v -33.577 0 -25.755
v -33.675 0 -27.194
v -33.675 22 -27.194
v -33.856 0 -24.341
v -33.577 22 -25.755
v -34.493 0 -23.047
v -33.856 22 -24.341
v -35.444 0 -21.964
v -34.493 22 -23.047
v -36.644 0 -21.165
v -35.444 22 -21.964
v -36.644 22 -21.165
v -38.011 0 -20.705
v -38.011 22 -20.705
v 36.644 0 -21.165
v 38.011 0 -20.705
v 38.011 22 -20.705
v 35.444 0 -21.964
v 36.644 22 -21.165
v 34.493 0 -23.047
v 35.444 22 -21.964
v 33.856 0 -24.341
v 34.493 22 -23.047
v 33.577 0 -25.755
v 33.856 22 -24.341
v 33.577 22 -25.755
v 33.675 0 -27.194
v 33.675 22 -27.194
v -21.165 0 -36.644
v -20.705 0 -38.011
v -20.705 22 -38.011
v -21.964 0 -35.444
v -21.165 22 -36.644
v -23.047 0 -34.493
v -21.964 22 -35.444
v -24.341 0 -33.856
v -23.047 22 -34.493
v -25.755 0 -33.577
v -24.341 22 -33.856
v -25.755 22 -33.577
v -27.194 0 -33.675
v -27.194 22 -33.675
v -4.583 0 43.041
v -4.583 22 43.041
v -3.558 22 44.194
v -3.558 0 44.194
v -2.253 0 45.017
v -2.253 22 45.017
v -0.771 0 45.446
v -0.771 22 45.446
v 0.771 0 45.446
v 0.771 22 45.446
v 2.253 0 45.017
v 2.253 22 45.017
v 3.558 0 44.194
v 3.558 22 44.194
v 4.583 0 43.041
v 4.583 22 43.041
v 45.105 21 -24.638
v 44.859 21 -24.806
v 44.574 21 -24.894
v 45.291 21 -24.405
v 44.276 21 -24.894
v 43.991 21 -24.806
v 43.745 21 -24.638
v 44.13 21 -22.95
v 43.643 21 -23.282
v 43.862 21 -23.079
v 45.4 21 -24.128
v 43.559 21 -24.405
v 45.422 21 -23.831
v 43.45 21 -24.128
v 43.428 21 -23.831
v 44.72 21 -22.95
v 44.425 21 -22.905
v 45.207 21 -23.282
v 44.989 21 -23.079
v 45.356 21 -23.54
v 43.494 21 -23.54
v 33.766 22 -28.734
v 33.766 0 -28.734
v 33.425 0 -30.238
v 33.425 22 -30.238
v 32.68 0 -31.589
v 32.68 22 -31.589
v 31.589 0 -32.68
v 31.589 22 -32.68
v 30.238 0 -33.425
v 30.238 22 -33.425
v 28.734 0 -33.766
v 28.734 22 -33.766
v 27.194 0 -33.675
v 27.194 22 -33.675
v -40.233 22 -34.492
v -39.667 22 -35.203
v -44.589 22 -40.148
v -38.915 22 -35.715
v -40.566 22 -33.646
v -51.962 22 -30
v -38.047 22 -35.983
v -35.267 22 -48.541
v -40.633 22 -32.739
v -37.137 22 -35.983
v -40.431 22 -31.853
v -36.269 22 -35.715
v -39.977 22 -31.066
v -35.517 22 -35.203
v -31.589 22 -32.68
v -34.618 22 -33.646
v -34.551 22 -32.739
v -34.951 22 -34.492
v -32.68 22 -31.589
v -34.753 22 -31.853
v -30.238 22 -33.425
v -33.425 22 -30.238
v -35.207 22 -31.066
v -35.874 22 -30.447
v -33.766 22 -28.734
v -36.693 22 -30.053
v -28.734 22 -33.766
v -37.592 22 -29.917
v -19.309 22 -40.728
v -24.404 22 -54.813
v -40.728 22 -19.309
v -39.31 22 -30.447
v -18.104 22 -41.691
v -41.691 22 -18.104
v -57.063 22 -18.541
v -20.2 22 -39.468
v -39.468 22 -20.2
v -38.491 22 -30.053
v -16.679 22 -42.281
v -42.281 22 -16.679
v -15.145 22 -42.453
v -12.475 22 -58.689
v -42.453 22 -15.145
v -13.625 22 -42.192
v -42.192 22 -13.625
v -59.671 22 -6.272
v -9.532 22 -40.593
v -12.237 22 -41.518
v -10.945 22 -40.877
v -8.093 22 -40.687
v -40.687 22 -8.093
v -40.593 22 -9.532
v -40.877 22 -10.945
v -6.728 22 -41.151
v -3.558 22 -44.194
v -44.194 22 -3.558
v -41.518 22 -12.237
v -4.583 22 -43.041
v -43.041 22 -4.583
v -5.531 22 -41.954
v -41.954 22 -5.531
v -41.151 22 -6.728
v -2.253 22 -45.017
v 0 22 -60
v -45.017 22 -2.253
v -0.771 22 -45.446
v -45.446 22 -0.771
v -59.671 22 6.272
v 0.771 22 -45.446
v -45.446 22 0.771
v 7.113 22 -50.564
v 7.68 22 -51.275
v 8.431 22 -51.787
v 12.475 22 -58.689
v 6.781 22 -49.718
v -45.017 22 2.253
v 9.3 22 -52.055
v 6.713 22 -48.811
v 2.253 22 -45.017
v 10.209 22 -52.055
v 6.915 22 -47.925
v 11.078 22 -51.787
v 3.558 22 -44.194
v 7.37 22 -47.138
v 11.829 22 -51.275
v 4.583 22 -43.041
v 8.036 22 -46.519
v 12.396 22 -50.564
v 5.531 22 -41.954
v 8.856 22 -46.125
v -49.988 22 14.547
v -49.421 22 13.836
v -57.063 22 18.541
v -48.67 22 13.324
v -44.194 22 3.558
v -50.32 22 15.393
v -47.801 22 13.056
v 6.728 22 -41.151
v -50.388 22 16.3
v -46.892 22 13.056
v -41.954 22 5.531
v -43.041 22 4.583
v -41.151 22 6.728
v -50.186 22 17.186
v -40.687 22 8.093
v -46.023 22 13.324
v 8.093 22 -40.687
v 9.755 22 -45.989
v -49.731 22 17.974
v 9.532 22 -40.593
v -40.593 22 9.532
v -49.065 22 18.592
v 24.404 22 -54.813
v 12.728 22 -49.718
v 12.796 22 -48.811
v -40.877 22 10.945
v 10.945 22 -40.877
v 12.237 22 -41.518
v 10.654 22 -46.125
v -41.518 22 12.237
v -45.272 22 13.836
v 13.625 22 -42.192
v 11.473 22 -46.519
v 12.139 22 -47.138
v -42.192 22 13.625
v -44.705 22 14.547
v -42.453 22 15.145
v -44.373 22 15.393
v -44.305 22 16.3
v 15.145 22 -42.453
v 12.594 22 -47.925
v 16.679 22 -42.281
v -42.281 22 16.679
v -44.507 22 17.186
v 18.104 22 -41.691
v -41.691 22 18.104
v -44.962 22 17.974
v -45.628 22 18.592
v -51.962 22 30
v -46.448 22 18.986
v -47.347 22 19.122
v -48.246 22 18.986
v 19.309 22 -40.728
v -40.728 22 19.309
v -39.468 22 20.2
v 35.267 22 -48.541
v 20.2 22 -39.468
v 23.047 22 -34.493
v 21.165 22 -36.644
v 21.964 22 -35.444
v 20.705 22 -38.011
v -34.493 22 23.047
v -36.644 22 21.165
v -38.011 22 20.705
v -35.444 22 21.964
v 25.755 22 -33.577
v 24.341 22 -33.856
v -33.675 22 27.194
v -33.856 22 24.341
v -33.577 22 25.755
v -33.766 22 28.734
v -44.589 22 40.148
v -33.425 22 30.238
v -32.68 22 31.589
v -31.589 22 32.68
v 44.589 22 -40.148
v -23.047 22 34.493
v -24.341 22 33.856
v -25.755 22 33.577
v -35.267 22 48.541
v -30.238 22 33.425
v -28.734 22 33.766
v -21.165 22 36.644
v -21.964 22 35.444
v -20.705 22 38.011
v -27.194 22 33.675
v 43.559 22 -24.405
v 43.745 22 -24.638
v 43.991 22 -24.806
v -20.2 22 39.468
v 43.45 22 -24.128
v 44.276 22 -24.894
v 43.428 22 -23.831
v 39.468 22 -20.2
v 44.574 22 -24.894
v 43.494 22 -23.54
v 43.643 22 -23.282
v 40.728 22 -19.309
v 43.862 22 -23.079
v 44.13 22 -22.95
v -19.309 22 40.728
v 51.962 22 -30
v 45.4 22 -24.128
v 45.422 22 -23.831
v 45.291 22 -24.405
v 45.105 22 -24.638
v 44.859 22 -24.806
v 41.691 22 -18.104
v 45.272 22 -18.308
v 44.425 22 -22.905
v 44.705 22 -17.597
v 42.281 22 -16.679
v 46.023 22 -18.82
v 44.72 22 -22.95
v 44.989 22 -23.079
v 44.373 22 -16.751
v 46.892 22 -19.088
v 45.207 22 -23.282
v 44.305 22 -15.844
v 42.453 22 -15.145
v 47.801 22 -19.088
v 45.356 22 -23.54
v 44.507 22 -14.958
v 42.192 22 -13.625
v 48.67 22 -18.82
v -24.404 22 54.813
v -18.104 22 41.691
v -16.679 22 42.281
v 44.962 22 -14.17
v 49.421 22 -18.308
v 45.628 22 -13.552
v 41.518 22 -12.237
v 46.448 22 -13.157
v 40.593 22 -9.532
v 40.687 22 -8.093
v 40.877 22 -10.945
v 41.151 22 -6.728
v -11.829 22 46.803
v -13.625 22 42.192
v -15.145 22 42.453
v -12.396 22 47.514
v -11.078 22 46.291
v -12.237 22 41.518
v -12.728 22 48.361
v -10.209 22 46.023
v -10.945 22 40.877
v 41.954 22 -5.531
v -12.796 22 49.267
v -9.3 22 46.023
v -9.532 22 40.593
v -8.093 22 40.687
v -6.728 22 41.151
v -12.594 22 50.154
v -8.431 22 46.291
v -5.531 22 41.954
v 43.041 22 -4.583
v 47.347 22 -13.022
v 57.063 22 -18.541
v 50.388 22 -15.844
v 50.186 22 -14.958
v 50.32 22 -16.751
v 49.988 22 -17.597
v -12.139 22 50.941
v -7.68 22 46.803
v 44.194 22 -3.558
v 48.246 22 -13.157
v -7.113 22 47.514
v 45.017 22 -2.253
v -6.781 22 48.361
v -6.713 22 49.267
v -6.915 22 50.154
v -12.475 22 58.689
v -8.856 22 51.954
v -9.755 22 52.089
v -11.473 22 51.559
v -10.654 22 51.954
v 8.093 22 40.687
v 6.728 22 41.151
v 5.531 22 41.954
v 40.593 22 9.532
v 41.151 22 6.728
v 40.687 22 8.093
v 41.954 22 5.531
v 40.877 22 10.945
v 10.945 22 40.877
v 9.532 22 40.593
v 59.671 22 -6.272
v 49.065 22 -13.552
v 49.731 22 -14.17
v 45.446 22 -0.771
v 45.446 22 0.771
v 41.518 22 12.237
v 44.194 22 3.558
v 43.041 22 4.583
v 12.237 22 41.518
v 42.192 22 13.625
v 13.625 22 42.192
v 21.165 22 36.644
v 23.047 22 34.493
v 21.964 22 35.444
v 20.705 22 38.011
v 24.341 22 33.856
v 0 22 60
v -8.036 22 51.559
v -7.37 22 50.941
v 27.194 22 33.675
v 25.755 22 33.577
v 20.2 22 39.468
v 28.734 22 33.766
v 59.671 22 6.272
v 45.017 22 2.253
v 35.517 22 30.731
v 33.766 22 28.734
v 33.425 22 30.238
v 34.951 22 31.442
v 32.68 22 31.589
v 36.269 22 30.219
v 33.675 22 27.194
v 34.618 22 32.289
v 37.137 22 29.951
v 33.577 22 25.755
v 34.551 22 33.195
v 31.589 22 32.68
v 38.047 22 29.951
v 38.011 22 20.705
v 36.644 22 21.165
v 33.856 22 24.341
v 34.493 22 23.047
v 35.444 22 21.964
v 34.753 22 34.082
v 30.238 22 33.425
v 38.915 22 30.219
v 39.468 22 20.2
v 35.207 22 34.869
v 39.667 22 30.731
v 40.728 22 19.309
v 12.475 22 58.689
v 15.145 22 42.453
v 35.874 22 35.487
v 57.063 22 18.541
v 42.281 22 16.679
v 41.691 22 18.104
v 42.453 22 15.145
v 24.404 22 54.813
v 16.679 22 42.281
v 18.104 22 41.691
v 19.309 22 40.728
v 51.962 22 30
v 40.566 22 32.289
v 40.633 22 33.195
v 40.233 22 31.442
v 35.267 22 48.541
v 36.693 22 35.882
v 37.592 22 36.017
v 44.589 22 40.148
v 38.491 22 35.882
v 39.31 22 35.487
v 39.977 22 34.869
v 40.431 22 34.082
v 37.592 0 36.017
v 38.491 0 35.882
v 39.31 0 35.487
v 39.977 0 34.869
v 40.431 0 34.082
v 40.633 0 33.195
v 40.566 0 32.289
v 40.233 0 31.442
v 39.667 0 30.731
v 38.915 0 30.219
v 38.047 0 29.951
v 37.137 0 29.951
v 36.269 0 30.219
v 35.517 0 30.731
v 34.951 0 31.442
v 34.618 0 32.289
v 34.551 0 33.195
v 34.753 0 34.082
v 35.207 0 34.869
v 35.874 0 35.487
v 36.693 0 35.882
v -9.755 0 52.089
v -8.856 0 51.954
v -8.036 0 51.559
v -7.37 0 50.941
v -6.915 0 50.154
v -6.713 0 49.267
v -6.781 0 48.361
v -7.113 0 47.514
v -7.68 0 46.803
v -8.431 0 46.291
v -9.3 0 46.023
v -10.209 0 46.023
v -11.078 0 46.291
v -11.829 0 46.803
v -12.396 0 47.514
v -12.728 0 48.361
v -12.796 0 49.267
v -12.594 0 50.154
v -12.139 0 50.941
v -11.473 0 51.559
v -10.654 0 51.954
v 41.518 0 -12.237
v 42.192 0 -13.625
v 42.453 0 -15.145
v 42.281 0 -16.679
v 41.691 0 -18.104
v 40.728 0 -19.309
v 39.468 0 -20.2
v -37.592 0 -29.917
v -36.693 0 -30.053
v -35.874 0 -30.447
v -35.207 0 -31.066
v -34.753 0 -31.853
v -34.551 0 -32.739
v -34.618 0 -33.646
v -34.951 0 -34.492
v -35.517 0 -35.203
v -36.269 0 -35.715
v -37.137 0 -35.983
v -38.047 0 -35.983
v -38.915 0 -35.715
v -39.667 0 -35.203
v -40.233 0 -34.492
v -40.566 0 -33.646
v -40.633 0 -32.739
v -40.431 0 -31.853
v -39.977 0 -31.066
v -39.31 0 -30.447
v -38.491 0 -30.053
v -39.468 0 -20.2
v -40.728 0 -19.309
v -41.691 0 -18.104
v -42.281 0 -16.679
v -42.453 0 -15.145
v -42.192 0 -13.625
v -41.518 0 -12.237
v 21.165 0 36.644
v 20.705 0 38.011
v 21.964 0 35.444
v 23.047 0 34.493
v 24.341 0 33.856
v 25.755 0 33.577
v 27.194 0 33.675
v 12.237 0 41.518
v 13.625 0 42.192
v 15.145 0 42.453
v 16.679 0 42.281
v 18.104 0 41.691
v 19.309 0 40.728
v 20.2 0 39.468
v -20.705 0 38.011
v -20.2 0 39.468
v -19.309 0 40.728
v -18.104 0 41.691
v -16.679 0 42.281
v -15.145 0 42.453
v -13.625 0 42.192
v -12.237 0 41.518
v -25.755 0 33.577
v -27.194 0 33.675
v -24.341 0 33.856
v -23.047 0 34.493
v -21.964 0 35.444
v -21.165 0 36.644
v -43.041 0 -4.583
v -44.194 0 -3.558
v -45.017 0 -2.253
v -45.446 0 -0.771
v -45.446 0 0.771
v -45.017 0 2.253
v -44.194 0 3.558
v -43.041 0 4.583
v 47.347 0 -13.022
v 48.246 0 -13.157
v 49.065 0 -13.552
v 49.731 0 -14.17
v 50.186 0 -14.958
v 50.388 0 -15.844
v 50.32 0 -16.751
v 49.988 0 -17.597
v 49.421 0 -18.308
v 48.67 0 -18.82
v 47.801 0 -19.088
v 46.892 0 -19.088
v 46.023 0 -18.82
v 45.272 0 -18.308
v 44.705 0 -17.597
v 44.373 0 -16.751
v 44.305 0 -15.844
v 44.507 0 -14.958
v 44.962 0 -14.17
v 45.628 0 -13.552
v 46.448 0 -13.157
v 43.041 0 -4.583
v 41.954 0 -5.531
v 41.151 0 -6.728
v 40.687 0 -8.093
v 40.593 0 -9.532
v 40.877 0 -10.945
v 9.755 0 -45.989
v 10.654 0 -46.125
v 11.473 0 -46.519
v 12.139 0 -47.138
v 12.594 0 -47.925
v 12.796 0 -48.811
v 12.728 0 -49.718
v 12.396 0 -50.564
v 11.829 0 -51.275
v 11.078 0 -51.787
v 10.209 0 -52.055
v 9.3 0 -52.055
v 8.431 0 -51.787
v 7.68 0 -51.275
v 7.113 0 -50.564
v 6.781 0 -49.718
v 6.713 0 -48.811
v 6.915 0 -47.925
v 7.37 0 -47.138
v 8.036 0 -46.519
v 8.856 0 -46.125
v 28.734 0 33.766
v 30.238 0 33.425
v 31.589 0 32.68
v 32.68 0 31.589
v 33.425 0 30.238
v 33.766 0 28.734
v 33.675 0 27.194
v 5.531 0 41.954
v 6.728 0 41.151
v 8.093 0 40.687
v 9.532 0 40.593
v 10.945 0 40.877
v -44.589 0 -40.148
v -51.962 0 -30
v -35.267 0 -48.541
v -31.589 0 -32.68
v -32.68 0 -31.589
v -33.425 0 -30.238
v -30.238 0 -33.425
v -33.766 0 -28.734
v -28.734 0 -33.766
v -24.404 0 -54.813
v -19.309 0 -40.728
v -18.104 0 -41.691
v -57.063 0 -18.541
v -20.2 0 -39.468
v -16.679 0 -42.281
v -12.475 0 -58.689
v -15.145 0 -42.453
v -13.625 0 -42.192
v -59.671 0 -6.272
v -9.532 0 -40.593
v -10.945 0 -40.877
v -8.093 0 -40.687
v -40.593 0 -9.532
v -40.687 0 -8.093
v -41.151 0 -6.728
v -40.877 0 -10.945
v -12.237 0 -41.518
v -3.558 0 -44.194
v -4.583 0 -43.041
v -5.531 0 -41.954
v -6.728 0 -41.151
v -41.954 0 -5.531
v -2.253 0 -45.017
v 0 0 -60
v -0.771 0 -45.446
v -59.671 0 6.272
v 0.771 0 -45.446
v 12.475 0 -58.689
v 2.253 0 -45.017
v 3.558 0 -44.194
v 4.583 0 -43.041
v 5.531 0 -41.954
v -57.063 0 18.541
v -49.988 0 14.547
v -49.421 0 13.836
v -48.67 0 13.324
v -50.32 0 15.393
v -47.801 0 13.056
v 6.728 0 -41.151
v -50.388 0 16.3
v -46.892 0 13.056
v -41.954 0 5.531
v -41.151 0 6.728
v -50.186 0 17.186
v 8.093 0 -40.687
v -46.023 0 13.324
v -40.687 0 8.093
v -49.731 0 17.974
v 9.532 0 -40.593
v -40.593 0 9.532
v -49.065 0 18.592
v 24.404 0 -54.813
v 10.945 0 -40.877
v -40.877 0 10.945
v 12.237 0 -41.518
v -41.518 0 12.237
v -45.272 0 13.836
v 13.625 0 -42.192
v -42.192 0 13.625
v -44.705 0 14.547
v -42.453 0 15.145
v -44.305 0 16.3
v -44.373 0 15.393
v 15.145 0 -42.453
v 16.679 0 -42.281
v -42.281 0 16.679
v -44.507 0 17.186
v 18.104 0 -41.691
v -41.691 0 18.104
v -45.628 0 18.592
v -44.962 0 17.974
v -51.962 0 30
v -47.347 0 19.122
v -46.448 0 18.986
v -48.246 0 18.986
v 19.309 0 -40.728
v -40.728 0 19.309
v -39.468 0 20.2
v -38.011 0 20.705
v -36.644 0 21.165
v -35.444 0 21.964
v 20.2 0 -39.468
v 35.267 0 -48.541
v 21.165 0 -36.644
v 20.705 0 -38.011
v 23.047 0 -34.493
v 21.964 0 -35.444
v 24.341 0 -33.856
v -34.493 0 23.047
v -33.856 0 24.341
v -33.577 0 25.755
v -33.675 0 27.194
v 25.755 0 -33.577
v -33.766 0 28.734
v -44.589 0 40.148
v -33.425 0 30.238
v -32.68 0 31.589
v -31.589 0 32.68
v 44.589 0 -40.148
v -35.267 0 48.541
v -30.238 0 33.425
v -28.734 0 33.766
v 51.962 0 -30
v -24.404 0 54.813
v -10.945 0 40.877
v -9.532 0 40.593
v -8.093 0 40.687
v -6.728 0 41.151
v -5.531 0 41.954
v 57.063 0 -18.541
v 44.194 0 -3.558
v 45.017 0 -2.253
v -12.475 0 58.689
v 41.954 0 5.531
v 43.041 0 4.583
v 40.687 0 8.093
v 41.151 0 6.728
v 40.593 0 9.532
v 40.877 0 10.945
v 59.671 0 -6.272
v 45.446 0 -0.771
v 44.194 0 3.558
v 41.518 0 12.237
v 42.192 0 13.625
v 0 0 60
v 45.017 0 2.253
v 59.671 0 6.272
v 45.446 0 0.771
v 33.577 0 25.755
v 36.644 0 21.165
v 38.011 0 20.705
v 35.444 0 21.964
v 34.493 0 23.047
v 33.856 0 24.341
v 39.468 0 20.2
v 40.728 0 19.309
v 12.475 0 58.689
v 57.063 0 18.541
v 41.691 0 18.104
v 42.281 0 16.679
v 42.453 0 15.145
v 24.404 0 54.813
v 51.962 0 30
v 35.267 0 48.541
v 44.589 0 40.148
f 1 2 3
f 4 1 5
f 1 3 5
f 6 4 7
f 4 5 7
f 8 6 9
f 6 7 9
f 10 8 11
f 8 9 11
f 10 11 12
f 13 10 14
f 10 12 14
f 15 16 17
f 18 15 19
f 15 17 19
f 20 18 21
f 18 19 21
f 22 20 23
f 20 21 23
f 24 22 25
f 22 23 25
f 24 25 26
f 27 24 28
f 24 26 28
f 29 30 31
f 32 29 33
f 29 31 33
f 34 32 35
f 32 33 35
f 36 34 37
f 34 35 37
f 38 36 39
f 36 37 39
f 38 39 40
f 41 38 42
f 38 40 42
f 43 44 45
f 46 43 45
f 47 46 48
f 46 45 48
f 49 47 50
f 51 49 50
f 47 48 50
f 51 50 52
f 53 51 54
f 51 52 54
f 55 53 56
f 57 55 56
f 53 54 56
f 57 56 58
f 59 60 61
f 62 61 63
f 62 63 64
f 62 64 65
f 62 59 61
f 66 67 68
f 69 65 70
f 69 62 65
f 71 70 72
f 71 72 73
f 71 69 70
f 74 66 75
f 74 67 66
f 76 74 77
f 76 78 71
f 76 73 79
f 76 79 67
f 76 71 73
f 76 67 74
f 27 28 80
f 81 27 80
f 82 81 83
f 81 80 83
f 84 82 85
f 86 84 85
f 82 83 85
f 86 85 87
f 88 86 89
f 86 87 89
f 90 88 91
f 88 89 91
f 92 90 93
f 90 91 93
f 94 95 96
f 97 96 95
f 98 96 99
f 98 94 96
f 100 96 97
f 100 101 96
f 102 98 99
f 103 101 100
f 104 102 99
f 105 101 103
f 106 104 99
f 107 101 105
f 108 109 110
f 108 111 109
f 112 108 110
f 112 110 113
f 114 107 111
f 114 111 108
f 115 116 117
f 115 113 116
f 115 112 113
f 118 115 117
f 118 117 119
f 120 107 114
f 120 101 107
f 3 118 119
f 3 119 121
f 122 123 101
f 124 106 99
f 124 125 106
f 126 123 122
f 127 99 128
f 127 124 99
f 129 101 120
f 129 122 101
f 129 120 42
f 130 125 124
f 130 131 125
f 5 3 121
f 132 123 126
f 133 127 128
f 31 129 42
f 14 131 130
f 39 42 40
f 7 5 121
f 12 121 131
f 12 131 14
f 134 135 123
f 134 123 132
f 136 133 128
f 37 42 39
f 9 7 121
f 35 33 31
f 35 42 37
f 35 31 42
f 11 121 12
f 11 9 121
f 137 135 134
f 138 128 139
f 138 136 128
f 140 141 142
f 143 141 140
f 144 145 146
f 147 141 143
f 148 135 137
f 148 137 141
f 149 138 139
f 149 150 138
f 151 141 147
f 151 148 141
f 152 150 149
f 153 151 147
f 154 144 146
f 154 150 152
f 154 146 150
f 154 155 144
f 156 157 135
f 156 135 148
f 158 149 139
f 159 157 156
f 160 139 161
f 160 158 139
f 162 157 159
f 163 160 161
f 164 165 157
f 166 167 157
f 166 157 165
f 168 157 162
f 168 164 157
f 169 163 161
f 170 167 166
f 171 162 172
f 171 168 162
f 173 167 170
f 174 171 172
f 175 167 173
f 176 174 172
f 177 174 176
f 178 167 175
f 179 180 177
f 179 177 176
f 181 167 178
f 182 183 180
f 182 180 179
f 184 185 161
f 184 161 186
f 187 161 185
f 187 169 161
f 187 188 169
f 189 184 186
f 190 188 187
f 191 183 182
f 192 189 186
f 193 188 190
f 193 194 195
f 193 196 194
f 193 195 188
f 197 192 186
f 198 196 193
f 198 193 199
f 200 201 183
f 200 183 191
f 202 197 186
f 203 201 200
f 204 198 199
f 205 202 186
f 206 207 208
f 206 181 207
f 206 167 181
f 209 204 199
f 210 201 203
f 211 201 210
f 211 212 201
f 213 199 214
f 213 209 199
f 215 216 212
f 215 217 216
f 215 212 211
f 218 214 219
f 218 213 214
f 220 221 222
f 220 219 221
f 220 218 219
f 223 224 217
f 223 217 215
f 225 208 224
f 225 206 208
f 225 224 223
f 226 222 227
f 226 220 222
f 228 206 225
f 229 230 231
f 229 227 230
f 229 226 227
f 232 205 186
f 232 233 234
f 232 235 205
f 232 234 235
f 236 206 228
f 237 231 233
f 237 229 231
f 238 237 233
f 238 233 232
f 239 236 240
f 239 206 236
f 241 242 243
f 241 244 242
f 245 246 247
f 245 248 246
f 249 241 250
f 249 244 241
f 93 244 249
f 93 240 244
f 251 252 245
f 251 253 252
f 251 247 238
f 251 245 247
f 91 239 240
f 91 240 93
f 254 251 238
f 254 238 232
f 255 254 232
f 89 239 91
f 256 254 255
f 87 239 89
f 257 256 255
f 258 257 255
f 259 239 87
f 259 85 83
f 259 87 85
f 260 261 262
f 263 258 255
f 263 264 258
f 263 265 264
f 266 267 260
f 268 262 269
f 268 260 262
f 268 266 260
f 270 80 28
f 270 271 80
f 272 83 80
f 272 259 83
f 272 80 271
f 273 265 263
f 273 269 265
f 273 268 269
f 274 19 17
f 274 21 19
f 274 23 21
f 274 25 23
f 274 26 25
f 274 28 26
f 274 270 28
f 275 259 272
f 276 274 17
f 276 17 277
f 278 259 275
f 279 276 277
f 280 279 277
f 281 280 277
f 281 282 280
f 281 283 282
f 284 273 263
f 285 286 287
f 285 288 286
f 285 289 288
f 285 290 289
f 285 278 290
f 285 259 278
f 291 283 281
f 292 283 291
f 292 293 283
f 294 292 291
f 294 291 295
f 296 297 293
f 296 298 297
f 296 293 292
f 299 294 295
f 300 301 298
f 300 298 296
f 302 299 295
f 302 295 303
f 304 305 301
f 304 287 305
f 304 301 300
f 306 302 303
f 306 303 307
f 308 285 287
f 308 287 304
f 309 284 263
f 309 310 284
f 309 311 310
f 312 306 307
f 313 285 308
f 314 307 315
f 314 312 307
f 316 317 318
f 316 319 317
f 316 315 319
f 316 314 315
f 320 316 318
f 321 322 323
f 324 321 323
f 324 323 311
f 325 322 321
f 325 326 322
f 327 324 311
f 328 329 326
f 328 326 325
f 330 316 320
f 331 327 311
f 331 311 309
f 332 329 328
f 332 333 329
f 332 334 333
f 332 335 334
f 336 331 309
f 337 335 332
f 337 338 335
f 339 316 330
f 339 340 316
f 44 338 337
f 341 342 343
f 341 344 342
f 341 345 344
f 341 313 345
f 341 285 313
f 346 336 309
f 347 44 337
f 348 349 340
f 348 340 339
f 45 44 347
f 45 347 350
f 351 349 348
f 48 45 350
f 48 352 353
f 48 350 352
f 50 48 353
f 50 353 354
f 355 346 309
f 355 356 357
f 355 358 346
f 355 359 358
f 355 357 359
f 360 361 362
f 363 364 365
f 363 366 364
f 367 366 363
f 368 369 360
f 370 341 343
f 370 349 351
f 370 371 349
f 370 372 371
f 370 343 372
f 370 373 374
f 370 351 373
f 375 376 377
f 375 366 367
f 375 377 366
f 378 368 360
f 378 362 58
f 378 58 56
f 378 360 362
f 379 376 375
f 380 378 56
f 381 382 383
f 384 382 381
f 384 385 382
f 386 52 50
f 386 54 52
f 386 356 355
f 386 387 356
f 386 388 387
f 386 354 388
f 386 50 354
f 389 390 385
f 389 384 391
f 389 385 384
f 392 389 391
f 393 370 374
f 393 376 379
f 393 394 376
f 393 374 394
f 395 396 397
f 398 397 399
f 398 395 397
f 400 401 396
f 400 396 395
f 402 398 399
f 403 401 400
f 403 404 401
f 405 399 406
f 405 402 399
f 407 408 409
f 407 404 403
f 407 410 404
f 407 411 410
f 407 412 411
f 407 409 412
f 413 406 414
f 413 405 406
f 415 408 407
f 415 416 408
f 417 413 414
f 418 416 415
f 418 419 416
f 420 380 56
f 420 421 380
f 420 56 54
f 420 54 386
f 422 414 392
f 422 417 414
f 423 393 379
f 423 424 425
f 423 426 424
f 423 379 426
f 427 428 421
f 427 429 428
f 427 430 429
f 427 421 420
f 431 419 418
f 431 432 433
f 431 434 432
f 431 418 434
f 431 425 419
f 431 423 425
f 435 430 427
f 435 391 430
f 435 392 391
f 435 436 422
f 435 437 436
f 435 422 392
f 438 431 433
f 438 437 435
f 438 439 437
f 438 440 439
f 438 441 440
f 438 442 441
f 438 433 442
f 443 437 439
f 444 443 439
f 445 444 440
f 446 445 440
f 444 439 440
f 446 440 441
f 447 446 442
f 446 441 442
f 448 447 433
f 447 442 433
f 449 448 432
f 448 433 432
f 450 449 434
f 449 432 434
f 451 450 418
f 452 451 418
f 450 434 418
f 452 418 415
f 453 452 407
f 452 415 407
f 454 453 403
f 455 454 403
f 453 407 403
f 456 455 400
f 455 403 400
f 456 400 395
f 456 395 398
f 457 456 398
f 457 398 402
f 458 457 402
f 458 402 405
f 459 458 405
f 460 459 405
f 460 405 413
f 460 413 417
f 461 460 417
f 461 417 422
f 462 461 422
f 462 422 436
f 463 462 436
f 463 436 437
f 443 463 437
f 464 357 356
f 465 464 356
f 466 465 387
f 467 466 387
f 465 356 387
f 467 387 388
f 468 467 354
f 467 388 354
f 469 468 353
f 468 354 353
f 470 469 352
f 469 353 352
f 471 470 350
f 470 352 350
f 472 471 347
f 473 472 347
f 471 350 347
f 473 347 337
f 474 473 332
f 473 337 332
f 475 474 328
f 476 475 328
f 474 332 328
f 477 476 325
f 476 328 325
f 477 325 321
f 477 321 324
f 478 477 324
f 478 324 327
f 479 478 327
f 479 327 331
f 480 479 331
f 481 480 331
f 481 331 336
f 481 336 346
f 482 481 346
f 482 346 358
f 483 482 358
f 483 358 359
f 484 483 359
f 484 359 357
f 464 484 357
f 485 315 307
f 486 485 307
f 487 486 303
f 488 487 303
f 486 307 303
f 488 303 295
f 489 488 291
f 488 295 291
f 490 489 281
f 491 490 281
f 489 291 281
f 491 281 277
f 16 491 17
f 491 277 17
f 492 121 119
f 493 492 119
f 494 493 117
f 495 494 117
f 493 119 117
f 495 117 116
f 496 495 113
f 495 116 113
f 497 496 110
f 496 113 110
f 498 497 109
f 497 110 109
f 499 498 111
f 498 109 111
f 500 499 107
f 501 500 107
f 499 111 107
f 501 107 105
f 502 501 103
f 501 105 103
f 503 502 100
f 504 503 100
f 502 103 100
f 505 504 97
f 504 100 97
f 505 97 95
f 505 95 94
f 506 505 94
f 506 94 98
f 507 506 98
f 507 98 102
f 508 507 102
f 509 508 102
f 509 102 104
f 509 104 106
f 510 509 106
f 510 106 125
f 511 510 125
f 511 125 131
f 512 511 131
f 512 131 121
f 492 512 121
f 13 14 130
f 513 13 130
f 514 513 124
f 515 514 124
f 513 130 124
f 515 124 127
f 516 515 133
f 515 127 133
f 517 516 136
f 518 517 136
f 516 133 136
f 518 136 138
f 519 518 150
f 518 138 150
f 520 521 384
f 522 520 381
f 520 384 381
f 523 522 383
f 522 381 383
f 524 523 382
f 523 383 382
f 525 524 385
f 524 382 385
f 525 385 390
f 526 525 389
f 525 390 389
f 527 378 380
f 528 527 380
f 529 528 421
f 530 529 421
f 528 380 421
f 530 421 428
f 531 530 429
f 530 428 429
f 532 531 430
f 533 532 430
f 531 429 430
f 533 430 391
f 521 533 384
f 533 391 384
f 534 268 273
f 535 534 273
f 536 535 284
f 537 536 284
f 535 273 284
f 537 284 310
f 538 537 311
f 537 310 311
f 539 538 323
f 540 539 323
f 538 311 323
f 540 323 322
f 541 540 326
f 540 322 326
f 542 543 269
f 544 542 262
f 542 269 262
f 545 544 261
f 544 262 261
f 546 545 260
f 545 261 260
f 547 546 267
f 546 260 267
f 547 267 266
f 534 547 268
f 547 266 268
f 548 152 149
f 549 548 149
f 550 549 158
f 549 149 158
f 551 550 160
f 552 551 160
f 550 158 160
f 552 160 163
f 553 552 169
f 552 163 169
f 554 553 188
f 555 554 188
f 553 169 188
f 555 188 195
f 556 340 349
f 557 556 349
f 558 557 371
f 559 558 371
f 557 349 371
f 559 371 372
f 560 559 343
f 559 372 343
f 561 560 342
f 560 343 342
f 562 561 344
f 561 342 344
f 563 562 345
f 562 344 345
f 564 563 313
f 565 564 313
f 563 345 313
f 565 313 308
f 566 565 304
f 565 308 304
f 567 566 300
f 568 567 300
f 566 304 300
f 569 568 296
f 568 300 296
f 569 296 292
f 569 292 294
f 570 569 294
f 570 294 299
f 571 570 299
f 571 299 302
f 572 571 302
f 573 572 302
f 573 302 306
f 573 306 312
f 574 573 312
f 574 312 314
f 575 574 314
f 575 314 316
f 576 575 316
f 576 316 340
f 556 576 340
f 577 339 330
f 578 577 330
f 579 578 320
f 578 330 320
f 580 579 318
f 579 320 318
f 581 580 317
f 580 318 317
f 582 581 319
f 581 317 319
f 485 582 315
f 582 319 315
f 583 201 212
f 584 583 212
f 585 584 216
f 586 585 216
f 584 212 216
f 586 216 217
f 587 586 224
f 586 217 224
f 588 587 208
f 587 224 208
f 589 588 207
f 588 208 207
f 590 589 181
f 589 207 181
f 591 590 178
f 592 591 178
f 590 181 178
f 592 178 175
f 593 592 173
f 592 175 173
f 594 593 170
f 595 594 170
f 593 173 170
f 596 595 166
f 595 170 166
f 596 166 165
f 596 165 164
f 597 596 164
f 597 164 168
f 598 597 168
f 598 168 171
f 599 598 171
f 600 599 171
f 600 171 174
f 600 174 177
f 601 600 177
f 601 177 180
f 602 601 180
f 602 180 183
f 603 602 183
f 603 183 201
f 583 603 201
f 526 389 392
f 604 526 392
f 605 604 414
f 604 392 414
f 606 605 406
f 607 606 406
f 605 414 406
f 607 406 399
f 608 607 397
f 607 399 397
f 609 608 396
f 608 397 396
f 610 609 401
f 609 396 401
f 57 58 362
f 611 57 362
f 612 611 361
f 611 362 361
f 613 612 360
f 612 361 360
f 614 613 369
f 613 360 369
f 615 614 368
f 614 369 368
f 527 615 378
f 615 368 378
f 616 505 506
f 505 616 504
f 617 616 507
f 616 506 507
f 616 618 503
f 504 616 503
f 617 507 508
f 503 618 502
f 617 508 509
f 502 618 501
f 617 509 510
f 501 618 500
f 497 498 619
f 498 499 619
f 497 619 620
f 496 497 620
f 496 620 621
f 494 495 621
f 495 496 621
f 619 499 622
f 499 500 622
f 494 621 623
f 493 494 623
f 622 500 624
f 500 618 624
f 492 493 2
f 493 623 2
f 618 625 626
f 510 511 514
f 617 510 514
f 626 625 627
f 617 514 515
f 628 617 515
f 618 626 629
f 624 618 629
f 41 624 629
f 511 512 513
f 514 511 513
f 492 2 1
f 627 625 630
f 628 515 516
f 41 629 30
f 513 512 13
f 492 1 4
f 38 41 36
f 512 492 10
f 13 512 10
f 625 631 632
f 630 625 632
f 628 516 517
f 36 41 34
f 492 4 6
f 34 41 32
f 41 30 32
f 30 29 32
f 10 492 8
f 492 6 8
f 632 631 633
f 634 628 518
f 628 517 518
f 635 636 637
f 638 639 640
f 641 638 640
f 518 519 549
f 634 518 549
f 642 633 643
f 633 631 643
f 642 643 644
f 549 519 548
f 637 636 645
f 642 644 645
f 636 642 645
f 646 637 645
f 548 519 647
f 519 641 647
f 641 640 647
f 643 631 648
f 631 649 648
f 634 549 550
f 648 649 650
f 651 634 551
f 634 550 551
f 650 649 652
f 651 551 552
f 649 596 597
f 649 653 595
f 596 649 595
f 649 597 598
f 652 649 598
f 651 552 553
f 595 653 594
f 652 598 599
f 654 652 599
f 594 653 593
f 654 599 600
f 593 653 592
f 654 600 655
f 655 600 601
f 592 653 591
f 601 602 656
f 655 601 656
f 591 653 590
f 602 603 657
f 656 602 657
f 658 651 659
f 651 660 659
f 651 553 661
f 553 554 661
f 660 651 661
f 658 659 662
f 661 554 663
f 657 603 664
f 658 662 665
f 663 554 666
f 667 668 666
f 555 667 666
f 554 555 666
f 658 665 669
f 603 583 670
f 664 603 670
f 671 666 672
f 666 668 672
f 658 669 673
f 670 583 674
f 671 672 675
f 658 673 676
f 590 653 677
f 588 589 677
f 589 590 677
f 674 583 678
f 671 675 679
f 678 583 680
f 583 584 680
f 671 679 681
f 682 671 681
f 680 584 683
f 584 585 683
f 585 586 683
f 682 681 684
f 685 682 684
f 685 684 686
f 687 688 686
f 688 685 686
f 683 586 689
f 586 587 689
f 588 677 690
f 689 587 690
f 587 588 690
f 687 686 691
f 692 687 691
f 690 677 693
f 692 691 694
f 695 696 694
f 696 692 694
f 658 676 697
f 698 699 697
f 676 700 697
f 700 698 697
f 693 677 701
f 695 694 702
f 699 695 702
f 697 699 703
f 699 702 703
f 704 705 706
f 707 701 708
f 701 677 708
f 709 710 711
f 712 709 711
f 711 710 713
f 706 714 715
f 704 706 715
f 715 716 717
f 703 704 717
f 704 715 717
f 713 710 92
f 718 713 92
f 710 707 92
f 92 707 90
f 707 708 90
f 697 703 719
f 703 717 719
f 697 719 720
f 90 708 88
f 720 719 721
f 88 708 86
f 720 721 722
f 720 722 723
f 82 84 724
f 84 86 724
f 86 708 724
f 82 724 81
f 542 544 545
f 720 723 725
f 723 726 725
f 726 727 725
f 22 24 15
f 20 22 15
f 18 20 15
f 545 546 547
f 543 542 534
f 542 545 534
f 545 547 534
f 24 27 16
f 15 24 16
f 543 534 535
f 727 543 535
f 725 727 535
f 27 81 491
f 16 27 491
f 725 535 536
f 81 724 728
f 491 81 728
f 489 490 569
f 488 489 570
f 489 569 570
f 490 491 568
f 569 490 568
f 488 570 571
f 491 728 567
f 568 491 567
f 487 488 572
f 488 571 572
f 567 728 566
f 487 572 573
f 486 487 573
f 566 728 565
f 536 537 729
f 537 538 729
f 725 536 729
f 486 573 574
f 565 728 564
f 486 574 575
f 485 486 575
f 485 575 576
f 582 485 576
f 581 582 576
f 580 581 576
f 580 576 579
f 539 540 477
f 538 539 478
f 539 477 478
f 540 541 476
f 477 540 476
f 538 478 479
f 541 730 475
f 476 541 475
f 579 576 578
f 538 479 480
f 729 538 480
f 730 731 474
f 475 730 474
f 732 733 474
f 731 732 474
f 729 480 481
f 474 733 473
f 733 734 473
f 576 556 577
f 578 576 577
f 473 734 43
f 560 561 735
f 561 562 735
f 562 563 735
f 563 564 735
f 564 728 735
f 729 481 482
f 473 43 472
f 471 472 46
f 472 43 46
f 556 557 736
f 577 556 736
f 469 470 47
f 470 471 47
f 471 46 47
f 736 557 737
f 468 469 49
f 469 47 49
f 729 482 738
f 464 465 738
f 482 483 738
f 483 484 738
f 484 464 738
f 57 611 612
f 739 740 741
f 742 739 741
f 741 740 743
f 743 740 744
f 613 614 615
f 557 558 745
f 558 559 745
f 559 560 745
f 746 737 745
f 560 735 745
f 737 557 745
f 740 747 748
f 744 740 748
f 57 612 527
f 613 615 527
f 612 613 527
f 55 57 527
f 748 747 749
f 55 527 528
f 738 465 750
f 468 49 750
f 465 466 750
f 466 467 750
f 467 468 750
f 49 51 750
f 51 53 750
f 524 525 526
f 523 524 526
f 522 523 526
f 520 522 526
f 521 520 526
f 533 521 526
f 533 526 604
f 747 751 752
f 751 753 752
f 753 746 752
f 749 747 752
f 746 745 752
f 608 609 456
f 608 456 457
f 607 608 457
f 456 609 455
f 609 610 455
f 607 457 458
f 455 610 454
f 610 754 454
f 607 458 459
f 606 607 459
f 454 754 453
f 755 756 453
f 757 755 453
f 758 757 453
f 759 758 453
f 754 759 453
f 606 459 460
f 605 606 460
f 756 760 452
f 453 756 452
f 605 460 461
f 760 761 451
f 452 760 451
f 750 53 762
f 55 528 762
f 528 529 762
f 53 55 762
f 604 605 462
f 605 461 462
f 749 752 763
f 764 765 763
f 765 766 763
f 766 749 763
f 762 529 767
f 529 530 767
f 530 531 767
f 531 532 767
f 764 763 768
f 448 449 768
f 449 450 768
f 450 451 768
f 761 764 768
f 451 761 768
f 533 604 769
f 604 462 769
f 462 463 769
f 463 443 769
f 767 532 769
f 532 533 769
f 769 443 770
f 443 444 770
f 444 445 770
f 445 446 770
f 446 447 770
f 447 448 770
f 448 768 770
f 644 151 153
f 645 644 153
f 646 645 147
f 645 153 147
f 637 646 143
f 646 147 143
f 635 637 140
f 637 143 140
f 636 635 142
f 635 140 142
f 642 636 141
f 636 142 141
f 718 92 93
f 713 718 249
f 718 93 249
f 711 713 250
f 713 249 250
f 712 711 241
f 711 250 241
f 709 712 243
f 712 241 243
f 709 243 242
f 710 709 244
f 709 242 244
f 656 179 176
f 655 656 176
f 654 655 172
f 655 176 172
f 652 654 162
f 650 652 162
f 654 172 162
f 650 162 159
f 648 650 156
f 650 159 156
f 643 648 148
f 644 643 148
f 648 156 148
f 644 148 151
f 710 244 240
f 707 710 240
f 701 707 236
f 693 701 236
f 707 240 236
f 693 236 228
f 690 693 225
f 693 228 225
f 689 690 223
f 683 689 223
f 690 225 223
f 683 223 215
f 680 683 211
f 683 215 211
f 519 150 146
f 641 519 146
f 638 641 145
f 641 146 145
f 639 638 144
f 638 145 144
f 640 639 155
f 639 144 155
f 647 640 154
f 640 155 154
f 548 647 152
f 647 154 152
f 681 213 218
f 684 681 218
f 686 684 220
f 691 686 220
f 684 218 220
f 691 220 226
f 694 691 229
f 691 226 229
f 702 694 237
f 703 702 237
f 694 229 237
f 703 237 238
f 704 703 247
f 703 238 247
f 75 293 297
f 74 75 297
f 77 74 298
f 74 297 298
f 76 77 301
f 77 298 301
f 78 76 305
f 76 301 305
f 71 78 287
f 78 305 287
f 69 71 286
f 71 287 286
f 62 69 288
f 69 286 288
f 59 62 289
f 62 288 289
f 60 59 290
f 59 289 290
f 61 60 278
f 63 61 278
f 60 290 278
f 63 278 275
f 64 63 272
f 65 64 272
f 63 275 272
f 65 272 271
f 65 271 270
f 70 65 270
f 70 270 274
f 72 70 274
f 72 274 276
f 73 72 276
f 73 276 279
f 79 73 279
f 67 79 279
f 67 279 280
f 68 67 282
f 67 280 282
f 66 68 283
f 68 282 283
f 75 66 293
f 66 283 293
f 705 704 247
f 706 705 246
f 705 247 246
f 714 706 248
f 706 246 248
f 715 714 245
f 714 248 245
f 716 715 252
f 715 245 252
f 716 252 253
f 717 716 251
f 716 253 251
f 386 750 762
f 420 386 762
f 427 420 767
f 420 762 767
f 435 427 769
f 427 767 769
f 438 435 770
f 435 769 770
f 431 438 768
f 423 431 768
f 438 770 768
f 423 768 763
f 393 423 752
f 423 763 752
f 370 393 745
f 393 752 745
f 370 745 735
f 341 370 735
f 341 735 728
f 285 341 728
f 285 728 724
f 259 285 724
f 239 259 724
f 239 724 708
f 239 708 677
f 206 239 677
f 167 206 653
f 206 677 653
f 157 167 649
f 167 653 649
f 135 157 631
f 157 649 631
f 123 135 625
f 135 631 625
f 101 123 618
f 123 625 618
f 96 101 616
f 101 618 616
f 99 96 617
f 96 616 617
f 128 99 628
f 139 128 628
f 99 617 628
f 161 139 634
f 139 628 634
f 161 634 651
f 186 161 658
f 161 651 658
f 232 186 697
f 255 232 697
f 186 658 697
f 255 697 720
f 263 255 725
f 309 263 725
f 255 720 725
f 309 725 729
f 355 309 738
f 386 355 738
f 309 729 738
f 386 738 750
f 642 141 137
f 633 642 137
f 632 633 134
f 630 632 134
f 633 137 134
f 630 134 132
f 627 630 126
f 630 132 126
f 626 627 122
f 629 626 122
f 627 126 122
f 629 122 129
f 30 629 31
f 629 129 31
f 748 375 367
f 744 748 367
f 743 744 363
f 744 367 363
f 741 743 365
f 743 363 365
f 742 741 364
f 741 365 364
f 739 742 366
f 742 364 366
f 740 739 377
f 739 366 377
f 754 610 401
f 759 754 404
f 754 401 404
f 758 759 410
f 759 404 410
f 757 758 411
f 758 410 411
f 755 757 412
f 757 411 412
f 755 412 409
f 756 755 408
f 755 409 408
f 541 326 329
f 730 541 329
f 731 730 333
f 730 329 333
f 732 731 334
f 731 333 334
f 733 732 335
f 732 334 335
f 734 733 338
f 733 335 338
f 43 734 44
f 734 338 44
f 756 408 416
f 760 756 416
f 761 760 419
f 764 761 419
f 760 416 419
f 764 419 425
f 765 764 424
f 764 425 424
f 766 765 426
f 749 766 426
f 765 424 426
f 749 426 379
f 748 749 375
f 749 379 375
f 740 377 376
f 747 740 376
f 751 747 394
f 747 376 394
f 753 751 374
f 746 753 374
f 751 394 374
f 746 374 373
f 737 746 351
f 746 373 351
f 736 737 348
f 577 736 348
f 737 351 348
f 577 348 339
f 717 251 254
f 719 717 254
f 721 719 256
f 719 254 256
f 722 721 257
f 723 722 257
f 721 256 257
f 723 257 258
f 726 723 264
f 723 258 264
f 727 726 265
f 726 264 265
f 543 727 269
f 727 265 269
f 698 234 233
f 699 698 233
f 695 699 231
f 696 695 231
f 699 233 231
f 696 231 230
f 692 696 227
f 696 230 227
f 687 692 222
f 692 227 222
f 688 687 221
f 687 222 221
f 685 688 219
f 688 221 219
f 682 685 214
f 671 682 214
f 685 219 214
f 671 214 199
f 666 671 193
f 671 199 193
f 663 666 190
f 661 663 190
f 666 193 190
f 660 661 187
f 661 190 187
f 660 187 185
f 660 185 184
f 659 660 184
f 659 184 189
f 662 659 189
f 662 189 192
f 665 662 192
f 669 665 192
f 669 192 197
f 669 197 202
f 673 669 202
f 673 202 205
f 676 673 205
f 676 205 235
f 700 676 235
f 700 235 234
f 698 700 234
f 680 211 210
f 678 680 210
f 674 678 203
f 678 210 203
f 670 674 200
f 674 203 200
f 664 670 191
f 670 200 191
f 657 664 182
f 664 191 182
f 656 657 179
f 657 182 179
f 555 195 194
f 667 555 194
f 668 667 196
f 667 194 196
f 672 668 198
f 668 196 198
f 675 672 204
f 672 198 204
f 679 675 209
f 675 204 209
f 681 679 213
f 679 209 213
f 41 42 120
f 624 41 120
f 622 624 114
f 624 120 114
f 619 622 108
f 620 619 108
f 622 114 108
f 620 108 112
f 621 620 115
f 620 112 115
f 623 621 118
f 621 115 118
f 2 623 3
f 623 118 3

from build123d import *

# Parameters (mm, degrees)
SKETCH1_R           = 60
BOSS_EXTRUDE1_DEPTH = 22
FILLET1_R           = 5
FILLET2_R           = 6
SKETCH3_R           = 3.05
CUT_EXTRUDE1_DEPTH  = 88.658428165
SKETCH9_R           = 1
CUT_EXTRUDE5_DEPTH  = 1
CUT_EXTRUDE7_DEPTH  = 88.658428165


with BuildPart() as part:
    # Sketch1 → Boss-Extrude1 (new body)
    with BuildSketch(Plane(origin=(0, 0, 0), x_dir=(1, 0, 0), z_dir=(0, 1, 0))):
        with Locations(Location((0, 0, 0), (0, 0, 270))):
            Circle(SKETCH1_R)
        with BuildLine():
            ThreePointArc((-31.591922188, 24.534678569), (-33.258784492, 22.222809321), (-34.756792584, 19.798115295))
            ThreePointArc((-34.756792584, 19.798115295), (-41.574578963, 17.220754456), (-38.576145309, 10.577382149))
            ThreePointArc((-38.576145309, 10.577382149), (-39.231411216, 7.803612881), (-39.6875, 4.99022482))
            ThreePointArc((-39.6875, 4.99022482), (-45, 0), (-39.6875, -4.99022482))
            ThreePointArc((-39.6875, -4.99022482), (-39.231411216, -7.803612881), (-38.576145309, -10.577382149))
            ThreePointArc((-38.576145309, -10.577382149), (-41.574578963, -17.220754456), (-34.756792584, -19.798115295))
            ThreePointArc((-34.756792584, -19.798115295), (-33.258784492, -22.222809321), (-31.591922188, -24.534678569))
            ThreePointArc((-31.591922188, -24.534678569), (-31.819805153, -31.819805153), (-24.534678569, -31.591922188))
            ThreePointArc((-24.534678569, -31.591922188), (-22.222809321, -33.258784492), (-19.798115295, -34.756792584))
            ThreePointArc((-19.798115295, -34.756792584), (-17.220754456, -41.574578963), (-10.577382149, -38.576145309))
            ThreePointArc((-10.577382149, -38.576145309), (-7.803612881, -39.231411216), (-4.99022482, -39.6875))
            ThreePointArc((-4.99022482, -39.6875), (0, -45), (4.99022482, -39.6875))
            ThreePointArc((4.99022482, -39.6875), (7.803612881, -39.231411216), (10.577382149, -38.576145309))
            ThreePointArc((10.577382149, -38.576145309), (17.220754456, -41.574578963), (19.798115295, -34.756792584))
            ThreePointArc((19.798115295, -34.756792584), (22.222809321, -33.258784492), (24.534678569, -31.591922188))
            ThreePointArc((24.534678569, -31.591922188), (31.819805153, -31.819805153), (31.591922188, -24.534678569))
            ThreePointArc((31.591922188, -24.534678569), (33.258784492, -22.222809321), (34.756792584, -19.798115295))
            ThreePointArc((34.756792584, -19.798115295), (41.574578963, -17.220754456), (38.576145309, -10.577382149))
            ThreePointArc((38.576145309, -10.577382149), (39.231411216, -7.803612881), (39.6875, -4.99022482))
            ThreePointArc((39.6875, -4.99022482), (45, 0), (39.6875, 4.99022482))
            ThreePointArc((39.6875, 4.99022482), (39.231411216, 7.803612881), (38.576145309, 10.577382149))
            ThreePointArc((38.576145309, 10.577382149), (41.574578963, 17.220754456), (34.756792584, 19.798115295))
            ThreePointArc((34.756792584, 19.798115295), (33.258784492, 22.222809321), (31.591922188, 24.534678569))
            ThreePointArc((31.591922188, 24.534678569), (31.819805153, 31.819805153), (24.534678569, 31.591922188))
            ThreePointArc((24.534678569, 31.591922188), (22.222809321, 33.258784492), (19.798115295, 34.756792584))
            ThreePointArc((19.798115295, 34.756792584), (17.220754456, 41.574578963), (10.577382149, 38.576145309))
            ThreePointArc((10.577382149, 38.576145309), (7.803612881, 39.231411216), (4.99022482, 39.6875))
            ThreePointArc((4.99022482, 39.6875), (0, 45), (-4.99022482, 39.6875))
            ThreePointArc((-4.99022482, 39.6875), (-7.803612881, 39.231411216), (-10.577382149, 38.576145309))
            ThreePointArc((-10.577382149, 38.576145309), (-17.220754456, 41.574578963), (-19.798115295, 34.756792584))
            ThreePointArc((-19.798115295, 34.756792584), (-22.222809321, 33.258784492), (-24.534678569, 31.591922188))
            ThreePointArc((-24.534678569, 31.591922188), (-31.819805153, 31.819805153), (-31.591922188, 24.534678569))
        make_face(mode=Mode.SUBTRACT)
    extrude(amount=BOSS_EXTRUDE1_DEPTH)

    # Fillet1
    # the kernel refuses this fillet: 5 mm, written as the material it takes off along each edge
    with BuildSketch(Plane(origin=(-31.591922188, -7.937782114, -24.534678569), x_dir=(-0.5708127348451637, 0, -0.8210802772802334), z_dir=(0, 1, 0))) as fillet1_piece_1:
        with BuildLine():
            CenterArc((3.572001951, 4.856162203), FILLET1_R, 201.908932705, 54.314665287)
            ThreePointArc((-1.066888508, 2.990500041), (-0.503760138, 1.505840103), (0, 0))
            ThreePointArc((0, 0), (1.190667317, 0.143837797), (2.381334634, 0))
        make_face()
    extrude(amount=37.875564228, mode=Mode.SUBTRACT)
    with BuildSketch(Plane(origin=(-34.756792584, -7.937782114, -19.798115295), x_dir=(-0.977019839336146, 0, -0.21314838386338178), z_dir=(0, 1, 0)), Plane(origin=(10.577382149, -7.937782114, 38.576145309), x_dir=(0.5401386861196337, 0, 0.8415760213771278), z_dir=(0, 1, 0)), Plane(origin=(-4.99022482, -7.937782114, 39.6875), x_dir=(0.176965876366712, 0, 0.984216987560041), z_dir=(0, 1, 0)), Plane(origin=(-19.798115295, -7.937782114, 34.756792584), x_dir=(-0.21314838386337953, 0, 0.9770198393361466), z_dir=(0, 1, 0)), Plane(origin=(-31.591922188, -7.937782114, 24.534678569), x_dir=(-0.5708127348451787, 0, 0.8210802772802229), z_dir=(0, 1, 0)), Plane(origin=(-38.576145309, -7.937782114, 10.577382149), x_dir=(-0.84157602137713, 0, 0.5401386861196305), z_dir=(0, 1, 0)), Plane(origin=(-39.6875, -7.937782114, -4.99022482), x_dir=(-0.9842169875600411, 0, 0.17696587636671054), z_dir=(0, 1, 0)), Plane(origin=(24.534678569, -7.937782114, 31.591922188), x_dir=(0.8210802772802258, 0, 0.5708127348451744), z_dir=(0, 1, 0)), Plane(origin=(34.756792584, -7.937782114, 19.798115295), x_dir=(0.9770198393361469, 0, 0.2131483838633775), z_dir=(0, 1, 0)), Plane(origin=(39.6875, -7.937782114, 4.99022482), x_dir=(0.9842169875600401, 0, -0.1769658763667165), z_dir=(0, 1, 0)), Plane(origin=(38.576145309, -7.937782114, -10.577382149), x_dir=(0.8415760213771245, 0, -0.5401386861196388), z_dir=(0, 1, 0)), Plane(origin=(31.591922188, -7.937782114, -24.534678569), x_dir=(0.5708127348451758, 0, -0.8210802772802248), z_dir=(0, 1, 0)), Plane(origin=(19.798115295, -7.937782114, -34.756792584), x_dir=(0.21314838386337198, 0, -0.9770198393361482), z_dir=(0, 1, 0)), Plane(origin=(4.99022482, -7.937782114, -39.6875), x_dir=(-0.17696587636672031, 0, -0.9842169875600394), z_dir=(0, 1, 0)), Plane(origin=(-10.577382149, -7.937782114, -38.576145309), x_dir=(-0.5401386861196261, 0, -0.8415760213771326), z_dir=(0, 1, 0)), Plane(origin=(-24.534678569, -7.937782114, -31.591922188), x_dir=(-0.82108027728022, 0, -0.5708127348451829), z_dir=(0, 1, 0))) as fillet1_piece_2:
        with BuildLine():
            CenterArc((3.572001951, -4.856162203), FILLET1_R, 103.776402008, 54.314665287)
            ThreePointArc((-1.066888508, -2.990500041), (-0.503760138, -1.505840103), (0, 0))
            ThreePointArc((0, 0), (1.190667317, -0.143837797), (2.381334634, 0))
        make_face()
    extrude(amount=37.875564228, mode=Mode.SUBTRACT)
    with BuildSketch(Plane(origin=(4.99022482, -7.937782114, 39.6875), x_dir=(0.9864543257067245, 0, -0.1640361645933343), z_dir=(0, 1, 0)), Plane(origin=(-10.577382149, -7.937782114, 38.576145309), x_dir=(0.9741388837762464, 0, 0.22595007217340898), z_dir=(0, 1, 0)), Plane(origin=(-24.534678569, -7.937782114, 31.591922188), x_dir=(0.8135196273818055, 0, 0.5815374586942516), z_dir=(0, 1, 0)), Plane(origin=(-34.756792584, -7.937782114, 19.798115295), x_dir=(0.5290493822922732, 0, 0.8485910387790836), z_dir=(0, 1, 0)), Plane(origin=(-39.6875, -7.937782114, 4.99022482), x_dir=(0.1640361645933272, 0, 0.9864543257067256), z_dir=(0, 1, 0)), Plane(origin=(-38.576145309, -7.937782114, -10.577382149), x_dir=(-0.22595007217340937, 0, 0.9741388837762464), z_dir=(0, 1, 0)), Plane(origin=(19.798115295, -7.937782114, 34.756792584), x_dir=(0.8485910387790846, 0, -0.5290493822922715), z_dir=(0, 1, 0)), Plane(origin=(31.591922188, -7.937782114, 24.534678569), x_dir=(0.5815374586942491, 0, -0.8135196273818073), z_dir=(0, 1, 0)), Plane(origin=(38.576145309, -7.937782114, 10.577382149), x_dir=(0.22595007217340277, 0, -0.9741388837762479), z_dir=(0, 1, 0)), Plane(origin=(39.6875, -7.937782114, -4.99022482), x_dir=(-0.16403616459333684, 0, -0.9864543257067241), z_dir=(0, 1, 0)), Plane(origin=(34.756792584, -7.937782114, -19.798115295), x_dir=(-0.5290493822922758, 0, -0.8485910387790819), z_dir=(0, 1, 0)), Plane(origin=(24.534678569, -7.937782114, -31.591922188), x_dir=(-0.8135196273818096, 0, -0.5815374586942458), z_dir=(0, 1, 0)), Plane(origin=(10.577382149, -7.937782114, -38.576145309), x_dir=(-0.9741388837762485, 0, -0.22595007217340046), z_dir=(0, 1, 0)), Plane(origin=(-4.99022482, -7.937782114, -39.6875), x_dir=(-0.9864543257067236, 0, 0.16403616459333964), z_dir=(0, 1, 0)), Plane(origin=(-19.798115295, -7.937782114, -34.756792584), x_dir=(-0.8485910387790874, 0, 0.5290493822922673), z_dir=(0, 1, 0))) as fillet1_piece_3:
        with BuildLine():
            CenterArc((3.373557398, -4.996060424), FILLET1_R, 92.274604499, 54.314665287)
            ThreePointArc((-0.800166381, -2.24287503), (-0.264608655, -1.169769307), (0, 0))
            ThreePointArc((0, 0), (1.587556423, -0.031516609), (3.175112846, 0))
        make_face()
    extrude(amount=37.875564228, mode=Mode.SUBTRACT)

    # Fillet2
    fillet2_edges = [part.edges().sort_by_distance(p)[0] for p in [
        (-7.805937782, 11, 39.243099283),
        (7.805937782, 11, 39.243099283),
        (22.229430079, 11, 33.268693157),
        (33.268693157, 11, 22.229430079),
        (-22.229430079, 11, 33.268693157),
        (-33.268693157, 11, 22.229430079),
        (-39.243099283, 11, 7.805937782),
        (-39.243099283, 11, -7.805937782),
        (39.243099283, 11, 7.805937782),
        (39.243099283, 11, -7.805937782),
        (33.268693157, 11, -22.229430079),
        (22.229430079, 11, -33.268693157),
        (7.805937782, 11, -39.243099283),
        (-7.805937782, 11, -39.243099283),
        (-22.229430079, 11, -33.268693157),
        (-33.268693157, 11, -22.229430079),
    ]]
    fillet(fillet2_edges, radius=FILLET2_R)

    # Sketch3 → Cut-Extrude1 (cut, through all)
    with BuildSketch(Plane(origin=(0, 22, 0), x_dir=(1, 0, 0), z_dir=(0, 1, 0))):
        with Locations(Location((9.754516101, 49.03926402, 0), (0, 0, 270))):
            Circle(SKETCH3_R)
        with Locations(Location((47.346506475, 16.071973265, 0), (0, 0, 270))):
            Circle(SKETCH3_R)
        with Locations(Location((37.591990374, -32.967290755, 0), (0, 0, 270))):
            Circle(SKETCH3_R)
        with Locations(Location((-9.754516101, -49.03926402, 0), (0, 0, 270))):
            Circle(SKETCH3_R)
        with Locations(Location((-47.346506475, -16.071973265, 0), (0, 0, 270))):
            Circle(SKETCH3_R)
        with Locations(Location((-37.591990374, 32.967290755, 0), (0, 0, 270))):
            Circle(SKETCH3_R)
    extrude(amount=-CUT_EXTRUDE1_DEPTH, mode=Mode.SUBTRACT)

    # Sketch9 → Cut-Extrude5 (cut)
    with BuildSketch(Plane(origin=(0, 22, 0), x_dir=(1, 0, 0), z_dir=(0, 1, 0))):
        with Locations(Location((44.425227151, 23.905313753, 0), (0, 0, 270))):
            Circle(SKETCH9_R)
    extrude(amount=-CUT_EXTRUDE5_DEPTH, mode=Mode.SUBTRACT)

    # Sketch11 → Cut-Extrude7 (cut, through all)
    with BuildSketch(Plane(origin=(0, 22, 0), x_dir=(1, 0, 0), z_dir=(0, 1, 0))):
        with BuildLine():
            ThreePointArc((-43.040639218, 4.583068093), (-45.5, 0), (-43.040639218, -4.583068093))
            ThreePointArc((-43.040639218, -4.583068093), (-40.686959394, -8.093139415), (-41.518229869, -12.23673674))
            ThreePointArc((-41.518229869, -12.23673674), (-42.036518729, -17.412096173), (-38.010501411, -20.705142354))
            ThreePointArc((-38.010501411, -20.705142354), (-34.492738655, -23.047311133), (-33.675046385, -27.193609331))
            ThreePointArc((-33.675046385, -27.193609331), (-32.173358544, -32.173358544), (-27.193609331, -33.675046385))
            ThreePointArc((-27.193609331, -33.675046385), (-23.047311133, -34.492738655), (-20.705142354, -38.010501411))
            ThreePointArc((-20.705142354, -38.010501411), (-17.412096173, -42.036518729), (-12.23673674, -41.518229869))
            ThreePointArc((-12.23673674, -41.518229869), (-8.093139415, -40.686959394), (-4.583068093, -43.040639218))
            ThreePointArc((-4.583068093, -43.040639218), (0, -45.5), (4.583068093, -43.040639218))
            ThreePointArc((4.583068093, -43.040639218), (8.093139415, -40.686959394), (12.23673674, -41.518229869))
            ThreePointArc((12.23673674, -41.518229869), (17.412096173, -42.036518729), (20.705142354, -38.010501411))
            ThreePointArc((20.705142354, -38.010501411), (23.047311133, -34.492738655), (27.193609331, -33.675046385))
            ThreePointArc((27.193609331, -33.675046385), (32.173358544, -32.173358544), (33.675046385, -27.193609331))
            ThreePointArc((33.675046385, -27.193609331), (34.492738655, -23.047311133), (38.010501411, -20.705142354))
            ThreePointArc((38.010501411, -20.705142354), (42.036518729, -17.412096173), (41.518229869, -12.23673674))
            ThreePointArc((41.518229869, -12.23673674), (40.686959394, -8.093139415), (43.040639218, -4.583068093))
            ThreePointArc((43.040639218, -4.583068093), (45.5, 0), (43.040639218, 4.583068093))
            ThreePointArc((43.040639218, 4.583068093), (40.686959394, 8.093139415), (41.518229869, 12.23673674))
            ThreePointArc((41.518229869, 12.23673674), (42.036518729, 17.412096173), (38.010501411, 20.705142354))
            ThreePointArc((38.010501411, 20.705142354), (34.492738655, 23.047311133), (33.675046385, 27.193609331))
            ThreePointArc((33.675046385, 27.193609331), (32.173358544, 32.173358544), (27.193609331, 33.675046385))
            ThreePointArc((27.193609331, 33.675046385), (23.047311133, 34.492738655), (20.705142354, 38.010501411))
            ThreePointArc((20.705142354, 38.010501411), (17.412096173, 42.036518729), (12.23673674, 41.518229869))
            ThreePointArc((12.23673674, 41.518229869), (8.093139415, 40.686959394), (4.583068093, 43.040639218))
            ThreePointArc((4.583068093, 43.040639218), (0, 45.5), (-4.583068093, 43.040639218))
            ThreePointArc((-4.583068093, 43.040639218), (-8.093139415, 40.686959394), (-12.23673674, 41.518229869))
            ThreePointArc((-12.23673674, 41.518229869), (-17.412096173, 42.036518729), (-20.705142354, 38.010501411))
            ThreePointArc((-20.705142354, 38.010501411), (-23.047311133, 34.492738655), (-27.193609331, 33.675046385))
            ThreePointArc((-27.193609331, 33.675046385), (-32.173358544, 32.173358544), (-33.675046385, 27.193609331))
            ThreePointArc((-33.675046385, 27.193609331), (-34.492738655, 23.047311133), (-38.010501411, 20.705142354))
            ThreePointArc((-38.010501411, 20.705142354), (-42.036518729, 17.412096173), (-41.518229869, 12.23673674))
            ThreePointArc((-41.518229869, 12.23673674), (-40.686959394, 8.093139415), (-43.040639218, 4.583068093))
        make_face()
    extrude(amount=-CUT_EXTRUDE7_DEPTH, mode=Mode.SUBTRACT)


solid = part.part
